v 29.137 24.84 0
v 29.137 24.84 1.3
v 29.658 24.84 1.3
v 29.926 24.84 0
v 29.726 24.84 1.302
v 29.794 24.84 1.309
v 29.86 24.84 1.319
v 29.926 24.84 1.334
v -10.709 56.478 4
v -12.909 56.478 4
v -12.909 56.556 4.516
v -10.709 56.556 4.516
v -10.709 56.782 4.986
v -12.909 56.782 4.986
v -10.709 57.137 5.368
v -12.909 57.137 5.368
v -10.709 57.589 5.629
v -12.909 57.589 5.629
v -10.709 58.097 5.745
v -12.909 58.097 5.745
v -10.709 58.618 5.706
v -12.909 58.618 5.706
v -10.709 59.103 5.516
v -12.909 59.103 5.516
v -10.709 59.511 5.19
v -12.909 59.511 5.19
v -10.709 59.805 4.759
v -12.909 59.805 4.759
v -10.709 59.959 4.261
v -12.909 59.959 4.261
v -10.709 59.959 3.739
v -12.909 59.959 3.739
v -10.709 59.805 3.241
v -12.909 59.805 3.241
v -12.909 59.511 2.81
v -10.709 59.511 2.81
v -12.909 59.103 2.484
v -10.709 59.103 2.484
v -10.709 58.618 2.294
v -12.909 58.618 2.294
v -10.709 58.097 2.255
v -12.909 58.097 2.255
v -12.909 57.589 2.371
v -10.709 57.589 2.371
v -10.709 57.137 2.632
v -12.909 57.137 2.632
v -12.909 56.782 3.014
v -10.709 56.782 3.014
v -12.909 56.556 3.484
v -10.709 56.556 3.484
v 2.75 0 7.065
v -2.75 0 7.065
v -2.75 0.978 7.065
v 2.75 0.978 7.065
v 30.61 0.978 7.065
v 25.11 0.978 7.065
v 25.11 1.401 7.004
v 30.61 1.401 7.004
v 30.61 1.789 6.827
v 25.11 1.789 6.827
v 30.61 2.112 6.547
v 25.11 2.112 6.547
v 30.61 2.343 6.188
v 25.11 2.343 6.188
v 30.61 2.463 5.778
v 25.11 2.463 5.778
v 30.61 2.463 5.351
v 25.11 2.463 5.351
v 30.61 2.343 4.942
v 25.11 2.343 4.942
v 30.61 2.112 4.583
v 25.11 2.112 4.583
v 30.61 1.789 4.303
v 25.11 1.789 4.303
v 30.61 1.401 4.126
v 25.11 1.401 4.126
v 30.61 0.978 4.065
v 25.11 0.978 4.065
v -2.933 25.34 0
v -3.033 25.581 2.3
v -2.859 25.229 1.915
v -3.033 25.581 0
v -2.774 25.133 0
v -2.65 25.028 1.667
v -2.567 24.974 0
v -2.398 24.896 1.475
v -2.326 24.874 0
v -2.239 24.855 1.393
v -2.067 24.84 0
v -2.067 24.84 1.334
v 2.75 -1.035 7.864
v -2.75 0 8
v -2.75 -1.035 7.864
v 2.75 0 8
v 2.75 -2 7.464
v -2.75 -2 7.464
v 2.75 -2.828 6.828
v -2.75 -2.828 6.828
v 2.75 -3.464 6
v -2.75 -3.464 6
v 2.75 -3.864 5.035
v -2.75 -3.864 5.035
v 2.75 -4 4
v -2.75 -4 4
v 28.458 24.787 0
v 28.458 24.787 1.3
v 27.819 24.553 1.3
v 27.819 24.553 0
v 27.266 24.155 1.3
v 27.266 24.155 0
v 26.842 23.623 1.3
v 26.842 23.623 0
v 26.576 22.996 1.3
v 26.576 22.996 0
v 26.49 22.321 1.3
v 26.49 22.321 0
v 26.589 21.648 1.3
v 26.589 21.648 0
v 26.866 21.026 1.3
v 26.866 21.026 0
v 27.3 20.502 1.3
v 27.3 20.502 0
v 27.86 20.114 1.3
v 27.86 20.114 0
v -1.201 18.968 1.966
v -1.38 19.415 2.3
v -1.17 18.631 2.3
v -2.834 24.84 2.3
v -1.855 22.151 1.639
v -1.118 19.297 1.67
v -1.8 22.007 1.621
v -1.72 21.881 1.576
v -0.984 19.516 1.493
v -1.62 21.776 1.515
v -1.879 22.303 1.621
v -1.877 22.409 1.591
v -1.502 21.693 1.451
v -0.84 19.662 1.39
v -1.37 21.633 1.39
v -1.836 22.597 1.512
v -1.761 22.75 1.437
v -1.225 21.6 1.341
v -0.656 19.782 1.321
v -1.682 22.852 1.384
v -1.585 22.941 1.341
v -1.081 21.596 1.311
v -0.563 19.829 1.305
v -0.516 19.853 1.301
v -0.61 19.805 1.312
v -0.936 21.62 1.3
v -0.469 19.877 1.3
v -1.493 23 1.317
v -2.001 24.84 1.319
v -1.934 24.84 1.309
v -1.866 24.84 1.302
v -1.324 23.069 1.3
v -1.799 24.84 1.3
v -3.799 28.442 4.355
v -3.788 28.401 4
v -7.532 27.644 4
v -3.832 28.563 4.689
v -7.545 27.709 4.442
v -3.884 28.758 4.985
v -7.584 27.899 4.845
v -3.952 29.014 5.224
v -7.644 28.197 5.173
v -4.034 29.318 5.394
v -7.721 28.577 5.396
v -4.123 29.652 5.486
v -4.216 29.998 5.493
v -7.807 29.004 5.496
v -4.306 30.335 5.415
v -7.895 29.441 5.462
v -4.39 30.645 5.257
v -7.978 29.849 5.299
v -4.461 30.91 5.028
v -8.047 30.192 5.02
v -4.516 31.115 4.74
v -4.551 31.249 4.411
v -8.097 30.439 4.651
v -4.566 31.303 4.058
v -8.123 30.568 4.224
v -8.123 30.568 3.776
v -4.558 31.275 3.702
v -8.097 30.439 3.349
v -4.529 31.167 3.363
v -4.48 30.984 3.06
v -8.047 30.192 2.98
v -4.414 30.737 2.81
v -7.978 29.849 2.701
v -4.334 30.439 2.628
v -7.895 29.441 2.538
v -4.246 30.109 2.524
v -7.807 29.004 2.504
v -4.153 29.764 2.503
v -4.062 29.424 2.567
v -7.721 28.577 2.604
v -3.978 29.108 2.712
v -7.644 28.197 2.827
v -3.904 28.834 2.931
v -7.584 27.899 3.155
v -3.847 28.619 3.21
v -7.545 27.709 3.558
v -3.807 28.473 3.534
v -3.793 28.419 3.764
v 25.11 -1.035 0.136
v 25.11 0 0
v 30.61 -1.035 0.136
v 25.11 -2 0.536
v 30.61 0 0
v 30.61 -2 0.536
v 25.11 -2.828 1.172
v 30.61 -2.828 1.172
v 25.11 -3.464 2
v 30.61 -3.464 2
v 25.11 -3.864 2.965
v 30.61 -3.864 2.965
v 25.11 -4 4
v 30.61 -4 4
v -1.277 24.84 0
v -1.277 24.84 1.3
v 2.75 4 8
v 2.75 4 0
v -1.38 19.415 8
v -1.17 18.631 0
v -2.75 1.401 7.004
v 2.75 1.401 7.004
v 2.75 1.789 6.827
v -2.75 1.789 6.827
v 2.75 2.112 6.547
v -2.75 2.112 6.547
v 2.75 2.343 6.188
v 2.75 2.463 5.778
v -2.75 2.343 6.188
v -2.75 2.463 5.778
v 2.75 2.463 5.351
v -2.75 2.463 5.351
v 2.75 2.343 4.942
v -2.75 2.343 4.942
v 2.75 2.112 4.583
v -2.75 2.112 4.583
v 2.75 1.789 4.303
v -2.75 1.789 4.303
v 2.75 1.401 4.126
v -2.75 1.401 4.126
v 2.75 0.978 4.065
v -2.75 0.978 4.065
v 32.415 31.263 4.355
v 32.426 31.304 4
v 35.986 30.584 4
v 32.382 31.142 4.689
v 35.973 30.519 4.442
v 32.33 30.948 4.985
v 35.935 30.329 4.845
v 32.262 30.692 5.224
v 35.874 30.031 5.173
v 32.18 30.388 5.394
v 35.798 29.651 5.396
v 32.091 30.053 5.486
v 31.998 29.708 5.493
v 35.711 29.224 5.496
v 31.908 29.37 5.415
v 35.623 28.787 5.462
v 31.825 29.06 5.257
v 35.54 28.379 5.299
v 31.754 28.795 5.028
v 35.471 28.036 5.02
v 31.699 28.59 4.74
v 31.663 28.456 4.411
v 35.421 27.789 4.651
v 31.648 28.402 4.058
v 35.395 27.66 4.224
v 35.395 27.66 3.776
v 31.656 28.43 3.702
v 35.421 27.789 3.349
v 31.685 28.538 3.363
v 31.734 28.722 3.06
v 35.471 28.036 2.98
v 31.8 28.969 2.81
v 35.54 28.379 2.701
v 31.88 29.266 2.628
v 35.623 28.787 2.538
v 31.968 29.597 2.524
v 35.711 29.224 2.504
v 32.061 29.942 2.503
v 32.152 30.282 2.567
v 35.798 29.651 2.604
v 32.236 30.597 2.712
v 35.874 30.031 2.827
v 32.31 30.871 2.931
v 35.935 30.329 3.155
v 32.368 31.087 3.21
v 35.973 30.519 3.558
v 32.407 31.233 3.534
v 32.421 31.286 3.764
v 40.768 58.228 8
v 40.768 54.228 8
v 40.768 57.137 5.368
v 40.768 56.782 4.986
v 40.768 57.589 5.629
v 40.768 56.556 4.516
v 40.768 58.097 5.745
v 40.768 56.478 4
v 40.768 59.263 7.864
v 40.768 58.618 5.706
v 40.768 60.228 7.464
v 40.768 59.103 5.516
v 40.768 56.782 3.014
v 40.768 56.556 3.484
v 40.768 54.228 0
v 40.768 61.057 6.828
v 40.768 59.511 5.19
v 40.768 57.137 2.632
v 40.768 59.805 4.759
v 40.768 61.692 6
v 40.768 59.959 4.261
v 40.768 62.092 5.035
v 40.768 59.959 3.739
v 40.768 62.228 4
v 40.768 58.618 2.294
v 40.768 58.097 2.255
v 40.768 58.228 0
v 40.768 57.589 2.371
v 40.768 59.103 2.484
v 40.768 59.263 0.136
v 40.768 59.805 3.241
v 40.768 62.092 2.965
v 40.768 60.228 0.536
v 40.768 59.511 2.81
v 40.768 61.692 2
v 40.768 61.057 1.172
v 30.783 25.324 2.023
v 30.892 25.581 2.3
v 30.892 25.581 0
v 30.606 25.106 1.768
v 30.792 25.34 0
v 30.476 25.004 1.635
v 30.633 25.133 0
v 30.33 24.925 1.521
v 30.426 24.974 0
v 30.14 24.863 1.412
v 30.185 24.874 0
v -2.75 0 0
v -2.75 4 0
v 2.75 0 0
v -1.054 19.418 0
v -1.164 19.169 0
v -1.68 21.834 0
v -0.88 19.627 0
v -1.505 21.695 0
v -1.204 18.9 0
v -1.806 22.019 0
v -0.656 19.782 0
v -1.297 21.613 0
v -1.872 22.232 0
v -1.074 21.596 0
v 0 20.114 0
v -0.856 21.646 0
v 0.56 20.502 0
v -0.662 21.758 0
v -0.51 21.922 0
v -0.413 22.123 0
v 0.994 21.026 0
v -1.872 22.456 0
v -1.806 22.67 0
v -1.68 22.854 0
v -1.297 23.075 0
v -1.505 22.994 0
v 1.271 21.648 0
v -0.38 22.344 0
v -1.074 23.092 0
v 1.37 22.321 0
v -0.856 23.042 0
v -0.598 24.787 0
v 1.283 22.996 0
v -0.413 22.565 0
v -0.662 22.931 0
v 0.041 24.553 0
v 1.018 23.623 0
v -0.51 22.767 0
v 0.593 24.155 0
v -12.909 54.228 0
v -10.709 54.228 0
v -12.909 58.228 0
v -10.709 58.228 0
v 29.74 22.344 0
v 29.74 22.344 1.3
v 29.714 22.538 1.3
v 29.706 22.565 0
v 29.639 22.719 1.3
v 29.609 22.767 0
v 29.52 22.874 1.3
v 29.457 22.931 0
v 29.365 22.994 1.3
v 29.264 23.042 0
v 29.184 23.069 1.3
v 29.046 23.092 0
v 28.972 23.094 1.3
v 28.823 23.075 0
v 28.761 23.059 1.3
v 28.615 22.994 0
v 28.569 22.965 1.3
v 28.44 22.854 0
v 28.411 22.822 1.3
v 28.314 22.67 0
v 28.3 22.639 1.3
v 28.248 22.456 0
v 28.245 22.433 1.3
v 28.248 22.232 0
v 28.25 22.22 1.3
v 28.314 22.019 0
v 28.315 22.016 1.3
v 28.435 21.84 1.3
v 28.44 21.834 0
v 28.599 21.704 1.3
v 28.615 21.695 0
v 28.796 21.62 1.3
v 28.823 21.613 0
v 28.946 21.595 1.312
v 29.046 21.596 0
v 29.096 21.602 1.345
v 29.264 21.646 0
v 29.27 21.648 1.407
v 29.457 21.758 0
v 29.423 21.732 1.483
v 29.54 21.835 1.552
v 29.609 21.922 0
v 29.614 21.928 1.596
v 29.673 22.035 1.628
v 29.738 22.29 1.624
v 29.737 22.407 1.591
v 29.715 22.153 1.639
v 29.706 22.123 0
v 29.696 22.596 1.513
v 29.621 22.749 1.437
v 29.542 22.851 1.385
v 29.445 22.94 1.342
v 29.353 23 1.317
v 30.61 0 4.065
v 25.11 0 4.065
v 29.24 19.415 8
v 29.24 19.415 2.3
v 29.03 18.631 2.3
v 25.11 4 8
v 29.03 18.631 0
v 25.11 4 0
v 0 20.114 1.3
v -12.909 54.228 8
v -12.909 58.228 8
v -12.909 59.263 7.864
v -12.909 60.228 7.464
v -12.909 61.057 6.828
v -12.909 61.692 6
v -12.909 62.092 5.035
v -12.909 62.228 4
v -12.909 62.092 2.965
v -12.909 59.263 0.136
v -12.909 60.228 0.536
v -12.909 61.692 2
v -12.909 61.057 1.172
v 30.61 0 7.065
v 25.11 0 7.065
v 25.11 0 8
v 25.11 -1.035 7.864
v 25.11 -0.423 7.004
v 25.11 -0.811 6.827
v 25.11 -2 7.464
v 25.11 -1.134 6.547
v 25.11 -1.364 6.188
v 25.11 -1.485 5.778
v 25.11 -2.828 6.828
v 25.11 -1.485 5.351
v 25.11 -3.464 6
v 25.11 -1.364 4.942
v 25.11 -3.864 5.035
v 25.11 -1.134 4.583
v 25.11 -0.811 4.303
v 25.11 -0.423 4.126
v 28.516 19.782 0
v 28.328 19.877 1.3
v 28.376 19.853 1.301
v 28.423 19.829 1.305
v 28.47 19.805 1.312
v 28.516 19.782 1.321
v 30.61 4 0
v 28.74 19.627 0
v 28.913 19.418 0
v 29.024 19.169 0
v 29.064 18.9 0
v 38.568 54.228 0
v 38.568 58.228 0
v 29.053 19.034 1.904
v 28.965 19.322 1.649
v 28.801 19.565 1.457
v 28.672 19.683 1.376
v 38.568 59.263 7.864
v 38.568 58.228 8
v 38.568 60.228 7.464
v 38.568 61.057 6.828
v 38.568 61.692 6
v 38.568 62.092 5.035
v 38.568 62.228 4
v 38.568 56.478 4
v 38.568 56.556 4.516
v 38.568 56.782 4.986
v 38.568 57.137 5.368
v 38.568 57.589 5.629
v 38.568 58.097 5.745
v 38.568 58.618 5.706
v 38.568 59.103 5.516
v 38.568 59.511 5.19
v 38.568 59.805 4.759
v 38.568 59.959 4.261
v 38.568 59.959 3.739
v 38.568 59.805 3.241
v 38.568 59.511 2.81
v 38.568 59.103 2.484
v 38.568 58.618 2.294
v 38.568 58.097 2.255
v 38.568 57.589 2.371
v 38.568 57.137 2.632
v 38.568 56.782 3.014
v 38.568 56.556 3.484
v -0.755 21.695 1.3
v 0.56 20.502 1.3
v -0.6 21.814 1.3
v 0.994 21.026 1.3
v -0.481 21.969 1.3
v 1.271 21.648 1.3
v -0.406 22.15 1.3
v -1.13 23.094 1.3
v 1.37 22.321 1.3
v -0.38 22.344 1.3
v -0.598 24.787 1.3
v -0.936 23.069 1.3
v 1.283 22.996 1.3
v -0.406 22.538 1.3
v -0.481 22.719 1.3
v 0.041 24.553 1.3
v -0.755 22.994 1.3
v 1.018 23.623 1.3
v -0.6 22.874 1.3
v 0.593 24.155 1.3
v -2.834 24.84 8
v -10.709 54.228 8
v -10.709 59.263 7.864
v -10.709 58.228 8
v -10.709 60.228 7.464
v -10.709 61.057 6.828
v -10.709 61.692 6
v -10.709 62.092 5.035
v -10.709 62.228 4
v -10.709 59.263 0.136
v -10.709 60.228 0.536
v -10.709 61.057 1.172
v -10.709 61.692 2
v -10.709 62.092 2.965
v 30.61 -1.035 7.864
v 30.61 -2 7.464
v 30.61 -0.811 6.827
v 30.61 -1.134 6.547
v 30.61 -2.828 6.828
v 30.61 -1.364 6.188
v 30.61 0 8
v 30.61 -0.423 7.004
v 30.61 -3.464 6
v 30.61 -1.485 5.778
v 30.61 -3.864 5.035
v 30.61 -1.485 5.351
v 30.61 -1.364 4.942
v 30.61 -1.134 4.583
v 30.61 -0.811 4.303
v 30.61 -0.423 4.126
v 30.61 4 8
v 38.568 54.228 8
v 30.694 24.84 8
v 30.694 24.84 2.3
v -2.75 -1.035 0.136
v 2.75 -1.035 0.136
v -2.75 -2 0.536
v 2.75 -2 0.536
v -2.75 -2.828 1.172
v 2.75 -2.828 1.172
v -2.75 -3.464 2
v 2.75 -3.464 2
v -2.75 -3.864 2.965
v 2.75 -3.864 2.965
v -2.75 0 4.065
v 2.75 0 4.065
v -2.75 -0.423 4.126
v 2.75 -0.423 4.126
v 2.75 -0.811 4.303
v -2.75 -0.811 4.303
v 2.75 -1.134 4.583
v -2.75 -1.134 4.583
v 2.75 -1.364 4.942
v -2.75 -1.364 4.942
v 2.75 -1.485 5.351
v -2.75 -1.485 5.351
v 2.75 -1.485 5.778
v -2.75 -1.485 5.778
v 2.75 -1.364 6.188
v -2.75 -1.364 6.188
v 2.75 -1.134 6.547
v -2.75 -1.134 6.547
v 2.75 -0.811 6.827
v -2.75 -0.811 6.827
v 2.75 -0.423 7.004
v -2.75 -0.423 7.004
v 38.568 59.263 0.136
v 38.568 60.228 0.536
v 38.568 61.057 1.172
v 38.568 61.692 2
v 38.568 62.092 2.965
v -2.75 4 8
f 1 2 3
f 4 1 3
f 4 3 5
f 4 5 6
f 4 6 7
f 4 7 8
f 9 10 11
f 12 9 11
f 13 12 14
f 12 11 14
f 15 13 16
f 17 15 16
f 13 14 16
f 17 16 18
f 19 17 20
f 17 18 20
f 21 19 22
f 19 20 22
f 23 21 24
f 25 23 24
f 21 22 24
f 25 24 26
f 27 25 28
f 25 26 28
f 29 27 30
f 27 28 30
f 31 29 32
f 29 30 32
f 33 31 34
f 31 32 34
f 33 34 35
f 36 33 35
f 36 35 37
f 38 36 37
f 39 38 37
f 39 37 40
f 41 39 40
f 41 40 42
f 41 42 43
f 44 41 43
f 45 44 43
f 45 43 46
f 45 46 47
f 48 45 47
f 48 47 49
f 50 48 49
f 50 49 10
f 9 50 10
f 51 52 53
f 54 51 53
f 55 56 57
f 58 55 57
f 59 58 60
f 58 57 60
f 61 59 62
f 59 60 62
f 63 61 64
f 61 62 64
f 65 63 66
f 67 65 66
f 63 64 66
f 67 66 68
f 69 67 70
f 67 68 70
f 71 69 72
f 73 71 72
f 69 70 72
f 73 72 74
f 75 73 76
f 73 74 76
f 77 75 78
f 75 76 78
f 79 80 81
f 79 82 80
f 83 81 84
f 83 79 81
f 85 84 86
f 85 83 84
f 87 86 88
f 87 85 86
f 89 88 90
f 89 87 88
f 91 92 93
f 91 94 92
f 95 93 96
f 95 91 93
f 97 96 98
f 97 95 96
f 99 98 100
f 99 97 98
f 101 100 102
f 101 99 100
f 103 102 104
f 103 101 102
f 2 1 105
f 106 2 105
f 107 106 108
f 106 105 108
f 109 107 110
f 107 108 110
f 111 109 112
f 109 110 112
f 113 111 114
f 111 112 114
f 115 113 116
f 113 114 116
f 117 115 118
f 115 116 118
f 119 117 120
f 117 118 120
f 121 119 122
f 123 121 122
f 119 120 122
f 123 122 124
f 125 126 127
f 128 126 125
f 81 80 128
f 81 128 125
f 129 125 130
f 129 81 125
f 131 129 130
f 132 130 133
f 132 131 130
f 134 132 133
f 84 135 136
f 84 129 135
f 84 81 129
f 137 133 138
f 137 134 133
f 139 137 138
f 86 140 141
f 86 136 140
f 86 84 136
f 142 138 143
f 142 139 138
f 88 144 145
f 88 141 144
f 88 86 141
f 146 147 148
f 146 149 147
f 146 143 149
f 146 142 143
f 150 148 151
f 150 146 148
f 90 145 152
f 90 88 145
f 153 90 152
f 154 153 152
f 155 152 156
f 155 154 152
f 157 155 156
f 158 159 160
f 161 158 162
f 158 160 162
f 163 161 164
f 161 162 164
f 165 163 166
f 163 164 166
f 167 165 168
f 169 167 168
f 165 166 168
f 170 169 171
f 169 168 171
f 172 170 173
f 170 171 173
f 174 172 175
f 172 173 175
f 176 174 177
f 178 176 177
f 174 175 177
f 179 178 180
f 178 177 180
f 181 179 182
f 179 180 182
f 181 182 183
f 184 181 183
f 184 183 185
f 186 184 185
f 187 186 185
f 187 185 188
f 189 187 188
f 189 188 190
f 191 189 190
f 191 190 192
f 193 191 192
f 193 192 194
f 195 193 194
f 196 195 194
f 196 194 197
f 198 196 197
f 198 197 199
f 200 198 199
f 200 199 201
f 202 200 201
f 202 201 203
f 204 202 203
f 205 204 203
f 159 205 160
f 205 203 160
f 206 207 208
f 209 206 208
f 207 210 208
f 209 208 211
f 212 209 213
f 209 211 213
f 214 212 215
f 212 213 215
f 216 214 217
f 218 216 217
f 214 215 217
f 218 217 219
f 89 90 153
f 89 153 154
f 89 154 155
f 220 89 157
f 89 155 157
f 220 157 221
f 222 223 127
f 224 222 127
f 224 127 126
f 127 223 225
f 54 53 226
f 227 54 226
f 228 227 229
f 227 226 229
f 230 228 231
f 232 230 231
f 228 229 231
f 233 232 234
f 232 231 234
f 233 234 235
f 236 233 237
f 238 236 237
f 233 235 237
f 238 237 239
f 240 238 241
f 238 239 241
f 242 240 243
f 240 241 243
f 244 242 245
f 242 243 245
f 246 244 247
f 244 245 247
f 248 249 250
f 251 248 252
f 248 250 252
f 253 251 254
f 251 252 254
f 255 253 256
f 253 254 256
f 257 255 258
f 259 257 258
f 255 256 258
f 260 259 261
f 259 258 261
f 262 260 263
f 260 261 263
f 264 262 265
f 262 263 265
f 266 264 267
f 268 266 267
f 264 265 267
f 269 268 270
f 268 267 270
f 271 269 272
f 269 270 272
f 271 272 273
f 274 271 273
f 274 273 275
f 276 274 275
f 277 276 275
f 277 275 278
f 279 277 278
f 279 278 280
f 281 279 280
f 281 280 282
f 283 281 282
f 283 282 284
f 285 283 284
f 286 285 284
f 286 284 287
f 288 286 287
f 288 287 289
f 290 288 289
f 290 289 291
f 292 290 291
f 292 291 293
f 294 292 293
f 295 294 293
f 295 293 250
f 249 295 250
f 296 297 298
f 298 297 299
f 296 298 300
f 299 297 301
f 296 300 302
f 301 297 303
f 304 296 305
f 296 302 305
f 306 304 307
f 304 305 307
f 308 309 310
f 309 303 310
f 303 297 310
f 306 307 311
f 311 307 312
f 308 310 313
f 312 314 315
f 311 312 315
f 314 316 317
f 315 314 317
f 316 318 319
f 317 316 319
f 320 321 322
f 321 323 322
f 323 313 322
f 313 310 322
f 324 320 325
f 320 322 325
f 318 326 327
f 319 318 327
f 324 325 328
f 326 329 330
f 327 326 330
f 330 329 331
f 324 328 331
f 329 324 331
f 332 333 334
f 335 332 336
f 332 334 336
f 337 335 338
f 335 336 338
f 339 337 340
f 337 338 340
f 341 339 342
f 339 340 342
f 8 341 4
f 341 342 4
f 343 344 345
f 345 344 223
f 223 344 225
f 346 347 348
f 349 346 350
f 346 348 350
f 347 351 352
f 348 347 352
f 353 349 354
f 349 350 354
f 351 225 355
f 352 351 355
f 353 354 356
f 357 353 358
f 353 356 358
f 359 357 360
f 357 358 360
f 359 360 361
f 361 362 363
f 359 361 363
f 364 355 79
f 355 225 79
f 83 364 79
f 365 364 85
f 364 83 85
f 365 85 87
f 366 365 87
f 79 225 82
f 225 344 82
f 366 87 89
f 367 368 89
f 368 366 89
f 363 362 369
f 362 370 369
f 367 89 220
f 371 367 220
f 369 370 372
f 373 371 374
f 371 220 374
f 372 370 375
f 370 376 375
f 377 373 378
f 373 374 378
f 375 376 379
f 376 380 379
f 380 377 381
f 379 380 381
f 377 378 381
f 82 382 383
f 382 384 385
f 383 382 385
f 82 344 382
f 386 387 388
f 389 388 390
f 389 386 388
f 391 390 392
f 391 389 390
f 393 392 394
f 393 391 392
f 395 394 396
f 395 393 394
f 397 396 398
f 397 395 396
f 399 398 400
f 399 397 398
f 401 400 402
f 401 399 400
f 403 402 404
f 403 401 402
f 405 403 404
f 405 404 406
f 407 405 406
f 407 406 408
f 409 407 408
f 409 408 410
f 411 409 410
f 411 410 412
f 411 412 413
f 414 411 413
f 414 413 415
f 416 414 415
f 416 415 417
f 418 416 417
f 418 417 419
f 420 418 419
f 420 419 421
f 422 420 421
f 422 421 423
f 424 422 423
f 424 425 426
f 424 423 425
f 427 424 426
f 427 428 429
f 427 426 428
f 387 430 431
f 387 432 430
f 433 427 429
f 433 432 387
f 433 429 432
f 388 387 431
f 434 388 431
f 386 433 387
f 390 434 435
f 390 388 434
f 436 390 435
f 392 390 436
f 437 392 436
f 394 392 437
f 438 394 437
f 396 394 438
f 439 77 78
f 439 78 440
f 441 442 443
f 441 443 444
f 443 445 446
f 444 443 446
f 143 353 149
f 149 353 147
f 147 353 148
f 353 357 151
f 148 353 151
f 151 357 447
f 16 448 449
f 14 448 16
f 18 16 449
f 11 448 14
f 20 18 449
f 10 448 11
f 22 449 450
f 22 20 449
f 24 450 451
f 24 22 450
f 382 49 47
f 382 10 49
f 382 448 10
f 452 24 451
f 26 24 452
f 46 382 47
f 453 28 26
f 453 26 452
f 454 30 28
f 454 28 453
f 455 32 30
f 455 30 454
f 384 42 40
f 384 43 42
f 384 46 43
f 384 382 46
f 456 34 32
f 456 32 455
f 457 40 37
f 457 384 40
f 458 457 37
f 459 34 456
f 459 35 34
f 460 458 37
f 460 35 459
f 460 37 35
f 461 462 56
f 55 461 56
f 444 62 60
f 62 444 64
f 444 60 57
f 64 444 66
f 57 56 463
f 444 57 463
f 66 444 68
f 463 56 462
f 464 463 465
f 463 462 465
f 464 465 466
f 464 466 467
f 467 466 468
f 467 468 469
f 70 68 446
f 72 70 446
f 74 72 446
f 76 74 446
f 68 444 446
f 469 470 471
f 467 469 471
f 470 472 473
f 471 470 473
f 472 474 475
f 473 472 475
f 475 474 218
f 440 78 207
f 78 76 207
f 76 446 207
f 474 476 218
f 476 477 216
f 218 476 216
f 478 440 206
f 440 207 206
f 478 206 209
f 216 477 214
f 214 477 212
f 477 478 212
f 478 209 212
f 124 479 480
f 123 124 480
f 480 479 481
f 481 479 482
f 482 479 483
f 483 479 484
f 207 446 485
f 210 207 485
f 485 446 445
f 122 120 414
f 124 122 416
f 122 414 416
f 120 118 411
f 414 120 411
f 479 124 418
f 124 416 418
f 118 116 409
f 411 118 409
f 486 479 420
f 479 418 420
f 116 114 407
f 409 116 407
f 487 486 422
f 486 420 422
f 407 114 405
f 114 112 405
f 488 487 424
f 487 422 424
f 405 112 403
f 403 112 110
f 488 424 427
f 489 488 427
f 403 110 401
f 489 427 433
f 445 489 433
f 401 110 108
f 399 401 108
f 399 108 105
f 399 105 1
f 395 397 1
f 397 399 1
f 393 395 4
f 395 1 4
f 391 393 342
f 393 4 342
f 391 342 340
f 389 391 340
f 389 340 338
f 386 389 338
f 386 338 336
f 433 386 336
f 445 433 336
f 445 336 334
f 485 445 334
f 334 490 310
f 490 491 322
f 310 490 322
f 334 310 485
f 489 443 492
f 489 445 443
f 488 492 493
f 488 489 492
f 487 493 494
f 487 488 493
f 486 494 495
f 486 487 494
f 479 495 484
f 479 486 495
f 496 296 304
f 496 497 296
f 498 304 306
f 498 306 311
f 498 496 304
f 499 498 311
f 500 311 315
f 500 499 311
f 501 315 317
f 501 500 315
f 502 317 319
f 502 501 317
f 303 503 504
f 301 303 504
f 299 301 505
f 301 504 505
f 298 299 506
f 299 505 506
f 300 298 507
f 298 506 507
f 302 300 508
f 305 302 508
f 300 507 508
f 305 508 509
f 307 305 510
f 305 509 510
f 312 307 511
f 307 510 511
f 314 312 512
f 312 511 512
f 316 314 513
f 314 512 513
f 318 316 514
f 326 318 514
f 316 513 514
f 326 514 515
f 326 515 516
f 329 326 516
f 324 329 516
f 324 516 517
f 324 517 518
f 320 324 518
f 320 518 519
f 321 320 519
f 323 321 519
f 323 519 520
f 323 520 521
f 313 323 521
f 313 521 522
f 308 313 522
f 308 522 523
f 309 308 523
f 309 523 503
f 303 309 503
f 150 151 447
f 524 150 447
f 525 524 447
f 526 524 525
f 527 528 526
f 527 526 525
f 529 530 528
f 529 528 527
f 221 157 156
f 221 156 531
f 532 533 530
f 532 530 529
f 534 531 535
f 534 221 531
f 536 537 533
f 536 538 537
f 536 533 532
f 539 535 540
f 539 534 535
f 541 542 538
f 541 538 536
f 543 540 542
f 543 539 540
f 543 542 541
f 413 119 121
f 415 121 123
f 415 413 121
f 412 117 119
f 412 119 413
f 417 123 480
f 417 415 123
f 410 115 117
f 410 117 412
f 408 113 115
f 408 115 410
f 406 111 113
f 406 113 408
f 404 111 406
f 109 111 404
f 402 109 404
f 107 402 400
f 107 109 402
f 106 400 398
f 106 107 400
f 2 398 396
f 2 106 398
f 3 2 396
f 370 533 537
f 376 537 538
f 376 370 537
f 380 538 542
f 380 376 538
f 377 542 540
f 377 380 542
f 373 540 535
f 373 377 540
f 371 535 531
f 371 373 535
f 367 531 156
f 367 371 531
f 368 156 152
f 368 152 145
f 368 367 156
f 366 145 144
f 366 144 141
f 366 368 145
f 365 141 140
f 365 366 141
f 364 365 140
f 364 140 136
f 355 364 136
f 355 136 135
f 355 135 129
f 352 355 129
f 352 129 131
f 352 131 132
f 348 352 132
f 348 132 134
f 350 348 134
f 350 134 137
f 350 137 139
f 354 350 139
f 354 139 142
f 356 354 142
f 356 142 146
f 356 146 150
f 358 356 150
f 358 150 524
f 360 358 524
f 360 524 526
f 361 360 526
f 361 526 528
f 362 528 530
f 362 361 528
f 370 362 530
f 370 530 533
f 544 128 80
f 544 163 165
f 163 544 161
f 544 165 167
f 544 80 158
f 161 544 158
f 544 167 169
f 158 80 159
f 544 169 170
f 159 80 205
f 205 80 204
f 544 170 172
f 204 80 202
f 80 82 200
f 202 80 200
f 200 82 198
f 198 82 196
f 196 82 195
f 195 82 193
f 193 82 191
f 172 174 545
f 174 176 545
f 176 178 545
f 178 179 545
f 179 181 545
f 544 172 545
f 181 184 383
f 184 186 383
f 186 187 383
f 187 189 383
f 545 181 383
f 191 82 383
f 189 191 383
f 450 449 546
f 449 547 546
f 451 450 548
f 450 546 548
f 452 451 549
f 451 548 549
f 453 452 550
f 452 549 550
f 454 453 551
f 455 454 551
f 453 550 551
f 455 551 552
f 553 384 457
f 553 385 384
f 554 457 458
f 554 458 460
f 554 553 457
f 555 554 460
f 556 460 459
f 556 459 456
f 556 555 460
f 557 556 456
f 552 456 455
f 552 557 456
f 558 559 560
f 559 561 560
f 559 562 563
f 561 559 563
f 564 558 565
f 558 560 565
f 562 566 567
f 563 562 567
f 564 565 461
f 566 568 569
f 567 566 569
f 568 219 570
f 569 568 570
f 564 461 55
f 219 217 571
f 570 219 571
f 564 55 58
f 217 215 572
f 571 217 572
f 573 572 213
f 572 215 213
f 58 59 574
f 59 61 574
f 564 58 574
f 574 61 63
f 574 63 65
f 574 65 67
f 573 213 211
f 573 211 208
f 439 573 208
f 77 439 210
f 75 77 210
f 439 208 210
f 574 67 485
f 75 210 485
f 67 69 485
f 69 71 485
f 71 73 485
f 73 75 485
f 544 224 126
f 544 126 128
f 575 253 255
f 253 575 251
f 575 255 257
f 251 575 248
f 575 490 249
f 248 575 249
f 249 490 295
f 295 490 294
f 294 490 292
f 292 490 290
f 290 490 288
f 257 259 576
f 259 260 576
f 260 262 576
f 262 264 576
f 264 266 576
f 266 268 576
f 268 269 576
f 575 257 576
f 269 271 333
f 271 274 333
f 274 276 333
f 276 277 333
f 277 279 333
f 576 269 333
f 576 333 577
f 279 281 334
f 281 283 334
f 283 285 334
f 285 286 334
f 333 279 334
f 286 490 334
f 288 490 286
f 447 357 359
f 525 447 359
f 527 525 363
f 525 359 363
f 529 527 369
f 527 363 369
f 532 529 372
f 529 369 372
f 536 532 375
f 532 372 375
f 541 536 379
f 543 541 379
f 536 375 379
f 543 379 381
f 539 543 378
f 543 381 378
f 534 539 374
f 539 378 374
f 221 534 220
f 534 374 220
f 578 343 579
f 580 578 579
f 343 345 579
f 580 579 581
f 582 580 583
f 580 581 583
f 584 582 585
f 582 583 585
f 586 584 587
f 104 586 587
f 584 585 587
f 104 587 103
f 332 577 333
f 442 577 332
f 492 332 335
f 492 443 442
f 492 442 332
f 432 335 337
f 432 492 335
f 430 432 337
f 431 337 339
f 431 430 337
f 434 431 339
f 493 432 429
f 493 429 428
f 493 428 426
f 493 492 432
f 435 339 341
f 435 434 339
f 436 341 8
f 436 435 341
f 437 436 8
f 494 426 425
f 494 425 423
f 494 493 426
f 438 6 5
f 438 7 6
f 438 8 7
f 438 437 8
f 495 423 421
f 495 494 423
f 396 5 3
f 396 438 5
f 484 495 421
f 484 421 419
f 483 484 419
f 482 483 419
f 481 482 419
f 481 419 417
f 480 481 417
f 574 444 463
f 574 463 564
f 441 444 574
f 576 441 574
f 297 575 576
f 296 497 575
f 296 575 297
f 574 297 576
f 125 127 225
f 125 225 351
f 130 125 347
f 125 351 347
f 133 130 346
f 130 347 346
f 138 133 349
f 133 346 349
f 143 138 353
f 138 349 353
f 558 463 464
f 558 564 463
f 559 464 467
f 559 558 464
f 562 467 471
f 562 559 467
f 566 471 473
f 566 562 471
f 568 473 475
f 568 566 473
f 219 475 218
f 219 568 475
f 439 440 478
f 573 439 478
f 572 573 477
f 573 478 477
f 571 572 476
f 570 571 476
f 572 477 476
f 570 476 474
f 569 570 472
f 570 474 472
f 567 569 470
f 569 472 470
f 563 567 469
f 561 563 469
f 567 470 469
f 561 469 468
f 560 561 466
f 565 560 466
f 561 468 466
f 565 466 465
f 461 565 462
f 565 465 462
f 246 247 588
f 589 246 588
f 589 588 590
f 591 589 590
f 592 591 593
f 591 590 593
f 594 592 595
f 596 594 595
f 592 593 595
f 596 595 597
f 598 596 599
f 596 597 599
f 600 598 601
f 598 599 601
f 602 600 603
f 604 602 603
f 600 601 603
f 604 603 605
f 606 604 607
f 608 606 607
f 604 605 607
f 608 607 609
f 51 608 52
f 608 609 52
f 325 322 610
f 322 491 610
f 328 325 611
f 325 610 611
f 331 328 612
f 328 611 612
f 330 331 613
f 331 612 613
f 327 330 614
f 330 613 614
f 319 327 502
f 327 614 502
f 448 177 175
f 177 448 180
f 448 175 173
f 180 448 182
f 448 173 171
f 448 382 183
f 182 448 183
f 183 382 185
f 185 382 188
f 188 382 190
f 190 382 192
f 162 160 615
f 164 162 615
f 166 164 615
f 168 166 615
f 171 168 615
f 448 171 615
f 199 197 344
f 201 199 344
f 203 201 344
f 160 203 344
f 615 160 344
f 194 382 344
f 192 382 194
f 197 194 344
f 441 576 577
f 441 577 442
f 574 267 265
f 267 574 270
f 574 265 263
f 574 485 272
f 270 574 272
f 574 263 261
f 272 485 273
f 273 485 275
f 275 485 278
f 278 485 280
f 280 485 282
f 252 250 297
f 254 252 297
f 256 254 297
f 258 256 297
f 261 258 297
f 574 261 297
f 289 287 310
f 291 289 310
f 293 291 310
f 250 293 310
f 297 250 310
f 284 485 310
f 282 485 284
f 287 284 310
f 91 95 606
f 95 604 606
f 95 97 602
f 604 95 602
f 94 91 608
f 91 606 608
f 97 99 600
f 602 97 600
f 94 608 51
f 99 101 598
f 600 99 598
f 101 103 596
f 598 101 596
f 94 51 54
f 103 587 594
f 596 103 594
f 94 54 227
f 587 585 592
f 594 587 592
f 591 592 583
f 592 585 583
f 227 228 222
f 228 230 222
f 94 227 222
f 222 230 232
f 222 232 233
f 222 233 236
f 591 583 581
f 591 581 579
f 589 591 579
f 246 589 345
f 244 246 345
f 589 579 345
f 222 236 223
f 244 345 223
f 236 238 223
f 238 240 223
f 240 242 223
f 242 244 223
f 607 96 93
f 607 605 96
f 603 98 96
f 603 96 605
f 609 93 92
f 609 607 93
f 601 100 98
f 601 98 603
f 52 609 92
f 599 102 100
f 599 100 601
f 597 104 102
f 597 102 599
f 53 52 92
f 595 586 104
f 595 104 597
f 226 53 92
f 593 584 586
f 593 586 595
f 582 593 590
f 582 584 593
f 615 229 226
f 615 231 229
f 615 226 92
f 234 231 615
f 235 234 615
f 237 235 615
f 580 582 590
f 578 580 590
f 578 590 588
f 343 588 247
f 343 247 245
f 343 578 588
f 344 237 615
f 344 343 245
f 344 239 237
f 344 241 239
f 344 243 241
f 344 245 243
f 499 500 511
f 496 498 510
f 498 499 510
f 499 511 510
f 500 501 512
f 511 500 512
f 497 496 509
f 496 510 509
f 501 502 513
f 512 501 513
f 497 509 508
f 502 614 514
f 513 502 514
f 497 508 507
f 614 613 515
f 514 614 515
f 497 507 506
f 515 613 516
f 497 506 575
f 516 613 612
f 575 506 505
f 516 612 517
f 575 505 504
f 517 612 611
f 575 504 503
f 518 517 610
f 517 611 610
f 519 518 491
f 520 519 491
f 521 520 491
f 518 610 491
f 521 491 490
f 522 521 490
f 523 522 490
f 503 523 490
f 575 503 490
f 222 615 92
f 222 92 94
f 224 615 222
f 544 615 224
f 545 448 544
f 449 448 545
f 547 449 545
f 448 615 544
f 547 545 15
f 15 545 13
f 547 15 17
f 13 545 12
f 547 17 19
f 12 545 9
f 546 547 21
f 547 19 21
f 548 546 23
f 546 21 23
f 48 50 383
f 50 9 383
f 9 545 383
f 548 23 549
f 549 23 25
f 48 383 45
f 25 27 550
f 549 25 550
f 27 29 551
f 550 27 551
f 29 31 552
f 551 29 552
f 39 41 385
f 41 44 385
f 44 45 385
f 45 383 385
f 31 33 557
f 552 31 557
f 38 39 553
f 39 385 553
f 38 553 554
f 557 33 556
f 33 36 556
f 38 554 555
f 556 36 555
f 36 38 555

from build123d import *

# Parameters (mm, degrees)
F1_DEPTH        = 8
F0_W            = 2.2
F0_H            = 8
F0_W_2          = 5.5
F0_R            = 0.75
F2_DEPTH        = 1.3
F3_R            = 1.75
F4_DEPTH        = 53.6778461441
F5_R            = 1.5
F6_DEPTH        = 25
F7_R            = 1.5
F8_DEPTH        = 25
F9_R            = 3.99999
F9_2_R          = 3.99999
F10_T1_DEPTH    = 1.3
F10_T6_DEPTH    = 10.6165464639
F10_S9_R        = 0.75
F10_T10_DEPTH   = 7
F10_T15_DEPTH   = 10.6165464639
F10_T19_DEPTH   = 3.3290625116
F10_T26_DEPTH   = 3.2183174699
F10_T30_DEPTH   = 10.6165464639
F10_2_T1_DEPTH  = 1.3
F10_2_T6_DEPTH  = 10.6165464639
F10_2_S9_R      = 0.75
F10_2_T10_DEPTH = 7
F10_2_T15_DEPTH = 3.3290625116
F10_2_T19_DEPTH = 10.6165464639
F10_2_T26_DEPTH = 10.6165464639
F10_2_T30_DEPTH = 3.2183174699


# Not quite as in the source:
# - a fillet or chamfer that OpenCascade refuses, or shapes differently, is made with other operations: its cross-section is extruded or revolved along the edge and cut away or added
# - a fillet or chamfer is up to 0.001 mm smaller than in the source, because OpenCascade refuses the exact size


with BuildPart() as f1:
    # F0 (on Top) → F1 (new body)
    with BuildSketch(Plane.XY):
        Polygon((38.5682557988, 62.228142967), (38.5682557988, 54.228142967), (30.6936795925, 24.8398244771), (29.2400103999, 19.414657193), (25.1096654534, 4), (25.1096654534, -4), (30.6096654534, -4), (30.6096654534, 4), (40.7682557988, 54.228142967), (40.7682557988, 62.228142967), align=None)
    extrude(amount=F1_DEPTH)

    # F0 (on Top) → F2, piece 2 (join)
    with BuildSketch(Plane.XY):
        with BuildLine():
            Line((29.2400103999, 19.414657193), (30.6936795925, 24.8398244771))
            Line((30.6936795925, 24.8398244771), (29.1367222868, 24.8398244771))
            ThreePointArc((29.1367222868, 24.8398244771), (26.5762608106, 22.9963479894), (27.8596654534, 20.1141195019))
            Line((27.8596654534, 20.1141195019), (29.2400103999, 19.414657193))
        make_face()
        with Locations((28.9896899666, 22.3441519231)):
            Circle(F0_R, mode=Mode.SUBTRACT)
    extrude(amount=F2_DEPTH)


with BuildPart() as f1b:
    # F0 (on Top) → F1, piece 2 (new body)
    with BuildSketch(Plane.XY):
        Polygon((-2.75, 4), (2.75, 4), (-1.3803449465, 19.414657193), (-2.834014139, 24.8398244771), (-10.7085903453, 54.228142967), (-12.9085903453, 54.228142967), align=None)
        with Locations((-11.8085903453, 58.228142967)):
            Rectangle(F0_W, F0_H)
        Rectangle(F0_W_2, F0_H)
    extrude(amount=F1_DEPTH)

    # F0 (on Top) → F2 (join)
    with BuildSketch(Plane.XY):
        with BuildLine():
            Line((-2.834014139, 24.8398244771), (-1.3803449465, 19.414657193))
            Line((-1.3803449465, 19.414657193), (0, 20.1141195019))
            ThreePointArc((0, 20.1141195019), (1.2834046428, 22.9963479894), (-1.2770568333, 24.8398244771))
            Line((-1.2770568333, 24.8398244771), (-2.834014139, 24.8398244771))
        make_face()
        with Locations((-1.1300245132, 22.3441519231)):
            Circle(F0_R, mode=Mode.SUBTRACT)
    extrude(amount=F2_DEPTH)


with BuildPart() as f4_tool:
    # F3 (on face) → F4 (new body, through all)
    with BuildSketch(Plane(origin=(-12.9085903453, 0, 0), x_dir=(0, -1, 0), z_dir=(-1, 0, 0))):
        with BuildLine():
            Line((-0.9781668196, 4.0648819543), (0, 4.0648819543))
            ThreePointArc((0, 4.0648819543), (1.5, 5.5648819543), (0, 7.0648819543))
            Line((0, 7.0648819543), (-0.9781668196, 7.0648819543))
            ThreePointArc((-0.9781668196, 7.0648819543), (-2.4781668196, 5.5648819543), (-0.9781668196, 4.0648819543))
        make_face()
        with Locations((-58.228142967, 4)):
            Circle(F3_R)
    extrude(amount=-F4_DEPTH)


with BuildPart() as f1_1:
    add(f1.part)

    # F4: cut by f4_tool
    add(f4_tool.part, mode=Mode.SUBTRACT)

    # F7 (on face) → F8 (cut)
    with BuildSketch(Plane(origin=(28.629586428, -5.7903044608, 0), x_dir=(0.1982352359, 0.9801544732, 0), z_dir=(0.9801544732, -0.1982352359, 0))):
        with Locations((35.611096924, 4)):
            Circle(F7_R)
    extrude(amount=-F8_DEPTH, mode=Mode.SUBTRACT)

    # F9 (radius 4 in the source; OpenCascade refuses exactly that, so slightly less here)
    f9_edges = [f1_1.edges().sort_by_distance(p)[0] for p in [
        (27.859665, -4, 8),
        (39.668256, 62.228143, 8),
        (39.668256, 62.228143, 0),
        (27.859665, -4, 0),
    ]]
    fillet(f9_edges, radius=F9_R)

    # F10: fillet of radius 1 on 3 edges, made by hand

    # F10_s2 → F10_t1 (join)
    with BuildSketch(Plane.XY):
        with BuildLine():
            ThreePointArc((30.8922784308, 25.581005432), (30.5351140335, 25.0464711368), (29.9263526045, 24.8398244771))
            Line((29.9263526045, 24.8398244771), (30.6936795925, 24.8398244771))
            Line((30.6936795925, 24.8398244771), (30.8922784308, 25.581005432))
        make_face()
        with BuildLine():
            ThreePointArc((29.0299463912, 18.6306876398), (28.9771136296, 19.2972579023), (28.5160303702, 19.7815196533))
            Line((28.5160303702, 19.7815196533), (29.2400103999, 19.414657193))
            Line((29.2400103999, 19.414657193), (29.0299463912, 18.6306876398))
        make_face()
    extrude(amount=F10_T1_DEPTH)


with BuildPart() as f1b_1:
    add(f1b.part)

    # F4: cut by f4_tool
    add(f4_tool.part, mode=Mode.SUBTRACT)

    # F5 (on face) → F6 (cut)
    with BuildSketch(Plane(origin=(-1.8647280633, -0.3771393363, 0), x_dir=(0.1982352359, -0.9801544732, 0), z_dir=(-0.9801544732, -0.1982352359, 0))):
        with Locations((-30.0883295718, 4)):
            Circle(F5_R)
    extrude(amount=-F6_DEPTH, mode=Mode.SUBTRACT)

    # F9#2 (radius 4 in the source; OpenCascade refuses exactly that, so slightly less here)
    f9_2_edges = [f1b_1.edges().sort_by_distance(p)[0] for p in [
        (-11.80859, 62.228143, 8),
        (0, -4, 8),
        (-11.80859, 62.228143, 0),
        (0, -4, 0),
    ]]
    fillet(f9_2_edges, radius=F9_2_R)

    # F10#2: fillet of radius 1 on 3 edges, made by hand

    # F10_2_s2 → F10_2_t1 (join)
    with BuildSketch(Plane.XY):
        with BuildLine():
            ThreePointArc((-1.1702809378, 18.6306876398), (-1.1174481761, 19.2972579023), (-0.6563649168, 19.7815196533))
            Line((-0.6563649168, 19.7815196533), (-1.3803449465, 19.414657193))
            Line((-1.3803449465, 19.414657193), (-1.1702809378, 18.6306876398))
        make_face()
        with BuildLine():
            ThreePointArc((-3.0326129774, 25.581005432), (-2.6754485801, 25.0464711368), (-2.0666871511, 24.8398244771))
            Line((-2.0666871511, 24.8398244771), (-2.834014139, 24.8398244771))
            Line((-2.834014139, 24.8398244771), (-3.0326129774, 25.581005432))
        make_face()
    extrude(amount=F10_2_T1_DEPTH)


with BuildPart() as f10_tool4:
    # F10_s5 → F10_t6 (new body)
    with BuildSketch(Plane(origin=(6.1653259788, 23.0093097982, 0), x_dir=(0, 0, 1), z_dir=(0.2588190451, 0.9659258263, 0))):
        with BuildLine():
            ThreePointArc((2.3, 23.2187981705), (1.5928932188, 22.9259049517), (1.3, 22.2187981705))
            Line((1.3, 22.2187981705), (1.3, 23.2187981705))
            Line((1.3, 23.2187981705), (2.3, 23.2187981705))
        make_face()
    extrude(amount=F10_T6_DEPTH)

    split(bisect_by=Plane.XZ.offset(-24.8398244771), keep=Keep.TOP)

    split(bisect_by=Plane(origin=(13.8020730291, 27.2375244736, 0), x_dir=(0, 0, 1), z_dir=(0.4520098053, 0.8920129685, 0)), keep=Keep.TOP)

    # F10_s9 → F10_t10 (cut, symmetric)
    with BuildSketch(Plane.XY.offset(1.8)):
        with Locations((28.9896899666, 22.3441519231)):
            Circle(F10_S9_R)
    extrude(amount=F10_T10_DEPTH, both=True, mode=Mode.SUBTRACT)


with BuildPart() as f1_2:
    add(f1_1.part)

    # F10_t3: union F10_tool4
    add(f10_tool4.part)


with BuildPart() as f10_tool13:
    # F10_s14 → F10_t15 (new body)
    with BuildSketch(Plane(origin=(6.1653259788, 23.0093097982, 0), x_dir=(0, 0, 1), z_dir=(0.2588190451, 0.9659258263, 0))):
        with BuildLine():
            ThreePointArc((2.3, 23.2187981705), (1.5928932188, 22.9259049517), (1.3, 22.2187981705))
            Line((1.3, 22.2187981705), (1.3, 23.2187981705))
            Line((1.3, 23.2187981705), (2.3, 23.2187981705))
        make_face()
    extrude(amount=F10_T15_DEPTH)

    split(bisect_by=Plane(origin=(13.8020730291, 27.2375244736, 0), x_dir=(0, 0, 1), z_dir=(-0.4520098053, -0.8920129685, 0)), keep=Keep.TOP)


with BuildPart() as f10_tool17:
    # F10_s18 → F10_t19 (new body)
    with BuildSketch(Plane.XY):
        with BuildLine():
            ThreePointArc((29.0299463912, 18.6306876398), (28.9771136296, 19.2972579023), (28.5160303702, 19.7815196533))
            Line((28.5160303702, 19.7815196533), (29.2400103999, 19.414657193))
            Line((29.2400103999, 19.414657193), (29.0299463912, 18.6306876398))
        make_face()
    extrude(amount=F10_T19_DEPTH)

    split(bisect_by=Plane.XY.offset(1.3), keep=Keep.TOP)


with BuildPart() as f10_tool13_1:
    add(f10_tool13.part)

    # F10_t21: intersect F10_tool17
    add(f10_tool17.part, mode=Mode.INTERSECT)


with BuildPart() as f1_3:
    add(f1_2.part)

    # F10_t11: union F10_tool13
    add(f10_tool13_1.part)


with BuildPart() as f10_tool24:
    # F10_s25 → F10_t26 (new body)
    with BuildSketch(Plane.XY):
        with BuildLine():
            ThreePointArc((30.8922784308, 25.581005432), (30.5351140335, 25.0464711368), (29.9263526045, 24.8398244771))
            Line((29.9263526045, 24.8398244771), (30.6936795925, 24.8398244771))
            Line((30.6936795925, 24.8398244771), (30.8922784308, 25.581005432))
        make_face()
    extrude(amount=F10_T26_DEPTH)

    split(bisect_by=Plane.XY.offset(1.3), keep=Keep.TOP)


with BuildPart() as f10_tool28:
    # F10_s29 → F10_t30 (new body)
    with BuildSketch(Plane(origin=(6.1653259788, 23.0093097982, 0), x_dir=(0, 0, 1), z_dir=(0.2588190451, 0.9659258263, 0))):
        with BuildLine():
            ThreePointArc((2.3, 23.2187981705), (1.5928932188, 22.9259049517), (1.3, 22.2187981705))
            Line((1.3, 22.2187981705), (1.3, 23.2187981705))
            Line((1.3, 23.2187981705), (2.3, 23.2187981705))
        make_face()
    extrude(amount=F10_T30_DEPTH)

    split(bisect_by=Plane.XZ.offset(-24.8398244771), keep=Keep.BOTTOM)


with BuildPart() as f10_tool24_1:
    add(f10_tool24.part)

    # F10_t32: intersect F10_tool28
    add(f10_tool28.part, mode=Mode.INTERSECT)


with BuildPart() as f1_4:
    add(f1_3.part)

    # F10_t22: union F10_tool24
    add(f10_tool24_1.part)


with BuildPart() as f10_2_tool4:
    # F10_2_s5 → F10_2_t6 (new body)
    with BuildSketch(Plane(origin=(-7.046846682, 26.2991898504, 0), x_dir=(0, 0, 1), z_dir=(0.2588190451, -0.9659258263, 0))):
        with BuildLine():
            ThreePointArc((2.3, -3.6915722027), (1.5928932188, -3.9844654215), (1.3, -4.6915722027))
            Line((1.3, -4.6915722027), (1.3, -3.6915722027))
            Line((1.3, -3.6915722027), (2.3, -3.6915722027))
        make_face()
    extrude(amount=F10_2_T6_DEPTH)

    split(bisect_by=Plane(origin=(-8.1099849882, 16.0045461381, 0), x_dir=(0, 0, 1), z_dir=(-0.4520098053, 0.8920129685, 0)), keep=Keep.TOP)

    split(bisect_by=Plane.XZ.offset(-24.8398244771), keep=Keep.TOP)

    # F10_2_s9 → F10_2_t10 (cut, symmetric)
    with BuildSketch(Plane.XY.offset(1.8)):
        with Locations((-1.1300245132, 22.3441519231)):
            Circle(F10_2_S9_R)
    extrude(amount=F10_2_T10_DEPTH, both=True, mode=Mode.SUBTRACT)


with BuildPart() as f1b_2:
    add(f1b_1.part)

    # F10_2_t3: union F10_2_tool4
    add(f10_2_tool4.part)


with BuildPart() as f10_2_tool13:
    # F10_2_s14 → F10_2_t15 (new body)
    with BuildSketch(Plane.XY):
        with BuildLine():
            ThreePointArc((-1.1702809378, 18.6306876398), (-1.1174481761, 19.2972579023), (-0.6563649168, 19.7815196533))
            Line((-0.6563649168, 19.7815196533), (-1.3803449465, 19.414657193))
            Line((-1.3803449465, 19.414657193), (-1.1702809378, 18.6306876398))
        make_face()
    extrude(amount=F10_2_T15_DEPTH)

    split(bisect_by=Plane.XY.offset(1.3), keep=Keep.TOP)


with BuildPart() as f10_2_tool17:
    # F10_2_s18 → F10_2_t19 (new body)
    with BuildSketch(Plane(origin=(-7.046846682, 26.2991898504, 0), x_dir=(0, 0, 1), z_dir=(0.2588190451, -0.9659258263, 0))):
        with BuildLine():
            ThreePointArc((2.3, -3.6915722027), (1.5928932188, -3.9844654215), (1.3, -4.6915722027))
            Line((1.3, -4.6915722027), (1.3, -3.6915722027))
            Line((1.3, -3.6915722027), (2.3, -3.6915722027))
        make_face()
    extrude(amount=F10_2_T19_DEPTH)

    split(bisect_by=Plane(origin=(-8.1099849882, 16.0045461381, 0), x_dir=(0, 0, 1), z_dir=(0.4520098053, -0.8920129685, 0)), keep=Keep.TOP)


with BuildPart() as f10_2_tool13_1:
    add(f10_2_tool13.part)

    # F10_2_t21: intersect F10_2_tool17
    add(f10_2_tool17.part, mode=Mode.INTERSECT)


with BuildPart() as f1b_3:
    add(f1b_2.part)

    # F10_2_t11: union F10_2_tool13
    add(f10_2_tool13_1.part)


with BuildPart() as f10_2_tool24:
    # F10_2_s25 → F10_2_t26 (new body)
    with BuildSketch(Plane(origin=(-7.046846682, 26.2991898504, 0), x_dir=(0, 0, 1), z_dir=(0.2588190451, -0.9659258263, 0))):
        with BuildLine():
            ThreePointArc((2.3, -3.6915722027), (1.5928932188, -3.9844654215), (1.3, -4.6915722027))
            Line((1.3, -4.6915722027), (1.3, -3.6915722027))
            Line((1.3, -3.6915722027), (2.3, -3.6915722027))
        make_face()
    extrude(amount=F10_2_T26_DEPTH)

    split(bisect_by=Plane.XZ.offset(-24.8398244771), keep=Keep.BOTTOM)


with BuildPart() as f10_2_tool28:
    # F10_2_s29 → F10_2_t30 (new body)
    with BuildSketch(Plane.XY):
        with BuildLine():
            ThreePointArc((-3.0326129774, 25.581005432), (-2.6754485801, 25.0464711368), (-2.0666871511, 24.8398244771))
            Line((-2.0666871511, 24.8398244771), (-2.834014139, 24.8398244771))
            Line((-2.834014139, 24.8398244771), (-3.0326129774, 25.581005432))
        make_face()
    extrude(amount=F10_2_T30_DEPTH)

    split(bisect_by=Plane.XY.offset(1.3), keep=Keep.TOP)


with BuildPart() as f10_2_tool24_1:
    add(f10_2_tool24.part)

    # F10_2_t32: intersect F10_2_tool28
    add(f10_2_tool28.part, mode=Mode.INTERSECT)


with BuildPart() as f1b_4:
    add(f1b_3.part)

    # F10_2_t22: union F10_2_tool24
    add(f10_2_tool24_1.part)


solid = Compound([f1_4.part, f1b_4.part])
